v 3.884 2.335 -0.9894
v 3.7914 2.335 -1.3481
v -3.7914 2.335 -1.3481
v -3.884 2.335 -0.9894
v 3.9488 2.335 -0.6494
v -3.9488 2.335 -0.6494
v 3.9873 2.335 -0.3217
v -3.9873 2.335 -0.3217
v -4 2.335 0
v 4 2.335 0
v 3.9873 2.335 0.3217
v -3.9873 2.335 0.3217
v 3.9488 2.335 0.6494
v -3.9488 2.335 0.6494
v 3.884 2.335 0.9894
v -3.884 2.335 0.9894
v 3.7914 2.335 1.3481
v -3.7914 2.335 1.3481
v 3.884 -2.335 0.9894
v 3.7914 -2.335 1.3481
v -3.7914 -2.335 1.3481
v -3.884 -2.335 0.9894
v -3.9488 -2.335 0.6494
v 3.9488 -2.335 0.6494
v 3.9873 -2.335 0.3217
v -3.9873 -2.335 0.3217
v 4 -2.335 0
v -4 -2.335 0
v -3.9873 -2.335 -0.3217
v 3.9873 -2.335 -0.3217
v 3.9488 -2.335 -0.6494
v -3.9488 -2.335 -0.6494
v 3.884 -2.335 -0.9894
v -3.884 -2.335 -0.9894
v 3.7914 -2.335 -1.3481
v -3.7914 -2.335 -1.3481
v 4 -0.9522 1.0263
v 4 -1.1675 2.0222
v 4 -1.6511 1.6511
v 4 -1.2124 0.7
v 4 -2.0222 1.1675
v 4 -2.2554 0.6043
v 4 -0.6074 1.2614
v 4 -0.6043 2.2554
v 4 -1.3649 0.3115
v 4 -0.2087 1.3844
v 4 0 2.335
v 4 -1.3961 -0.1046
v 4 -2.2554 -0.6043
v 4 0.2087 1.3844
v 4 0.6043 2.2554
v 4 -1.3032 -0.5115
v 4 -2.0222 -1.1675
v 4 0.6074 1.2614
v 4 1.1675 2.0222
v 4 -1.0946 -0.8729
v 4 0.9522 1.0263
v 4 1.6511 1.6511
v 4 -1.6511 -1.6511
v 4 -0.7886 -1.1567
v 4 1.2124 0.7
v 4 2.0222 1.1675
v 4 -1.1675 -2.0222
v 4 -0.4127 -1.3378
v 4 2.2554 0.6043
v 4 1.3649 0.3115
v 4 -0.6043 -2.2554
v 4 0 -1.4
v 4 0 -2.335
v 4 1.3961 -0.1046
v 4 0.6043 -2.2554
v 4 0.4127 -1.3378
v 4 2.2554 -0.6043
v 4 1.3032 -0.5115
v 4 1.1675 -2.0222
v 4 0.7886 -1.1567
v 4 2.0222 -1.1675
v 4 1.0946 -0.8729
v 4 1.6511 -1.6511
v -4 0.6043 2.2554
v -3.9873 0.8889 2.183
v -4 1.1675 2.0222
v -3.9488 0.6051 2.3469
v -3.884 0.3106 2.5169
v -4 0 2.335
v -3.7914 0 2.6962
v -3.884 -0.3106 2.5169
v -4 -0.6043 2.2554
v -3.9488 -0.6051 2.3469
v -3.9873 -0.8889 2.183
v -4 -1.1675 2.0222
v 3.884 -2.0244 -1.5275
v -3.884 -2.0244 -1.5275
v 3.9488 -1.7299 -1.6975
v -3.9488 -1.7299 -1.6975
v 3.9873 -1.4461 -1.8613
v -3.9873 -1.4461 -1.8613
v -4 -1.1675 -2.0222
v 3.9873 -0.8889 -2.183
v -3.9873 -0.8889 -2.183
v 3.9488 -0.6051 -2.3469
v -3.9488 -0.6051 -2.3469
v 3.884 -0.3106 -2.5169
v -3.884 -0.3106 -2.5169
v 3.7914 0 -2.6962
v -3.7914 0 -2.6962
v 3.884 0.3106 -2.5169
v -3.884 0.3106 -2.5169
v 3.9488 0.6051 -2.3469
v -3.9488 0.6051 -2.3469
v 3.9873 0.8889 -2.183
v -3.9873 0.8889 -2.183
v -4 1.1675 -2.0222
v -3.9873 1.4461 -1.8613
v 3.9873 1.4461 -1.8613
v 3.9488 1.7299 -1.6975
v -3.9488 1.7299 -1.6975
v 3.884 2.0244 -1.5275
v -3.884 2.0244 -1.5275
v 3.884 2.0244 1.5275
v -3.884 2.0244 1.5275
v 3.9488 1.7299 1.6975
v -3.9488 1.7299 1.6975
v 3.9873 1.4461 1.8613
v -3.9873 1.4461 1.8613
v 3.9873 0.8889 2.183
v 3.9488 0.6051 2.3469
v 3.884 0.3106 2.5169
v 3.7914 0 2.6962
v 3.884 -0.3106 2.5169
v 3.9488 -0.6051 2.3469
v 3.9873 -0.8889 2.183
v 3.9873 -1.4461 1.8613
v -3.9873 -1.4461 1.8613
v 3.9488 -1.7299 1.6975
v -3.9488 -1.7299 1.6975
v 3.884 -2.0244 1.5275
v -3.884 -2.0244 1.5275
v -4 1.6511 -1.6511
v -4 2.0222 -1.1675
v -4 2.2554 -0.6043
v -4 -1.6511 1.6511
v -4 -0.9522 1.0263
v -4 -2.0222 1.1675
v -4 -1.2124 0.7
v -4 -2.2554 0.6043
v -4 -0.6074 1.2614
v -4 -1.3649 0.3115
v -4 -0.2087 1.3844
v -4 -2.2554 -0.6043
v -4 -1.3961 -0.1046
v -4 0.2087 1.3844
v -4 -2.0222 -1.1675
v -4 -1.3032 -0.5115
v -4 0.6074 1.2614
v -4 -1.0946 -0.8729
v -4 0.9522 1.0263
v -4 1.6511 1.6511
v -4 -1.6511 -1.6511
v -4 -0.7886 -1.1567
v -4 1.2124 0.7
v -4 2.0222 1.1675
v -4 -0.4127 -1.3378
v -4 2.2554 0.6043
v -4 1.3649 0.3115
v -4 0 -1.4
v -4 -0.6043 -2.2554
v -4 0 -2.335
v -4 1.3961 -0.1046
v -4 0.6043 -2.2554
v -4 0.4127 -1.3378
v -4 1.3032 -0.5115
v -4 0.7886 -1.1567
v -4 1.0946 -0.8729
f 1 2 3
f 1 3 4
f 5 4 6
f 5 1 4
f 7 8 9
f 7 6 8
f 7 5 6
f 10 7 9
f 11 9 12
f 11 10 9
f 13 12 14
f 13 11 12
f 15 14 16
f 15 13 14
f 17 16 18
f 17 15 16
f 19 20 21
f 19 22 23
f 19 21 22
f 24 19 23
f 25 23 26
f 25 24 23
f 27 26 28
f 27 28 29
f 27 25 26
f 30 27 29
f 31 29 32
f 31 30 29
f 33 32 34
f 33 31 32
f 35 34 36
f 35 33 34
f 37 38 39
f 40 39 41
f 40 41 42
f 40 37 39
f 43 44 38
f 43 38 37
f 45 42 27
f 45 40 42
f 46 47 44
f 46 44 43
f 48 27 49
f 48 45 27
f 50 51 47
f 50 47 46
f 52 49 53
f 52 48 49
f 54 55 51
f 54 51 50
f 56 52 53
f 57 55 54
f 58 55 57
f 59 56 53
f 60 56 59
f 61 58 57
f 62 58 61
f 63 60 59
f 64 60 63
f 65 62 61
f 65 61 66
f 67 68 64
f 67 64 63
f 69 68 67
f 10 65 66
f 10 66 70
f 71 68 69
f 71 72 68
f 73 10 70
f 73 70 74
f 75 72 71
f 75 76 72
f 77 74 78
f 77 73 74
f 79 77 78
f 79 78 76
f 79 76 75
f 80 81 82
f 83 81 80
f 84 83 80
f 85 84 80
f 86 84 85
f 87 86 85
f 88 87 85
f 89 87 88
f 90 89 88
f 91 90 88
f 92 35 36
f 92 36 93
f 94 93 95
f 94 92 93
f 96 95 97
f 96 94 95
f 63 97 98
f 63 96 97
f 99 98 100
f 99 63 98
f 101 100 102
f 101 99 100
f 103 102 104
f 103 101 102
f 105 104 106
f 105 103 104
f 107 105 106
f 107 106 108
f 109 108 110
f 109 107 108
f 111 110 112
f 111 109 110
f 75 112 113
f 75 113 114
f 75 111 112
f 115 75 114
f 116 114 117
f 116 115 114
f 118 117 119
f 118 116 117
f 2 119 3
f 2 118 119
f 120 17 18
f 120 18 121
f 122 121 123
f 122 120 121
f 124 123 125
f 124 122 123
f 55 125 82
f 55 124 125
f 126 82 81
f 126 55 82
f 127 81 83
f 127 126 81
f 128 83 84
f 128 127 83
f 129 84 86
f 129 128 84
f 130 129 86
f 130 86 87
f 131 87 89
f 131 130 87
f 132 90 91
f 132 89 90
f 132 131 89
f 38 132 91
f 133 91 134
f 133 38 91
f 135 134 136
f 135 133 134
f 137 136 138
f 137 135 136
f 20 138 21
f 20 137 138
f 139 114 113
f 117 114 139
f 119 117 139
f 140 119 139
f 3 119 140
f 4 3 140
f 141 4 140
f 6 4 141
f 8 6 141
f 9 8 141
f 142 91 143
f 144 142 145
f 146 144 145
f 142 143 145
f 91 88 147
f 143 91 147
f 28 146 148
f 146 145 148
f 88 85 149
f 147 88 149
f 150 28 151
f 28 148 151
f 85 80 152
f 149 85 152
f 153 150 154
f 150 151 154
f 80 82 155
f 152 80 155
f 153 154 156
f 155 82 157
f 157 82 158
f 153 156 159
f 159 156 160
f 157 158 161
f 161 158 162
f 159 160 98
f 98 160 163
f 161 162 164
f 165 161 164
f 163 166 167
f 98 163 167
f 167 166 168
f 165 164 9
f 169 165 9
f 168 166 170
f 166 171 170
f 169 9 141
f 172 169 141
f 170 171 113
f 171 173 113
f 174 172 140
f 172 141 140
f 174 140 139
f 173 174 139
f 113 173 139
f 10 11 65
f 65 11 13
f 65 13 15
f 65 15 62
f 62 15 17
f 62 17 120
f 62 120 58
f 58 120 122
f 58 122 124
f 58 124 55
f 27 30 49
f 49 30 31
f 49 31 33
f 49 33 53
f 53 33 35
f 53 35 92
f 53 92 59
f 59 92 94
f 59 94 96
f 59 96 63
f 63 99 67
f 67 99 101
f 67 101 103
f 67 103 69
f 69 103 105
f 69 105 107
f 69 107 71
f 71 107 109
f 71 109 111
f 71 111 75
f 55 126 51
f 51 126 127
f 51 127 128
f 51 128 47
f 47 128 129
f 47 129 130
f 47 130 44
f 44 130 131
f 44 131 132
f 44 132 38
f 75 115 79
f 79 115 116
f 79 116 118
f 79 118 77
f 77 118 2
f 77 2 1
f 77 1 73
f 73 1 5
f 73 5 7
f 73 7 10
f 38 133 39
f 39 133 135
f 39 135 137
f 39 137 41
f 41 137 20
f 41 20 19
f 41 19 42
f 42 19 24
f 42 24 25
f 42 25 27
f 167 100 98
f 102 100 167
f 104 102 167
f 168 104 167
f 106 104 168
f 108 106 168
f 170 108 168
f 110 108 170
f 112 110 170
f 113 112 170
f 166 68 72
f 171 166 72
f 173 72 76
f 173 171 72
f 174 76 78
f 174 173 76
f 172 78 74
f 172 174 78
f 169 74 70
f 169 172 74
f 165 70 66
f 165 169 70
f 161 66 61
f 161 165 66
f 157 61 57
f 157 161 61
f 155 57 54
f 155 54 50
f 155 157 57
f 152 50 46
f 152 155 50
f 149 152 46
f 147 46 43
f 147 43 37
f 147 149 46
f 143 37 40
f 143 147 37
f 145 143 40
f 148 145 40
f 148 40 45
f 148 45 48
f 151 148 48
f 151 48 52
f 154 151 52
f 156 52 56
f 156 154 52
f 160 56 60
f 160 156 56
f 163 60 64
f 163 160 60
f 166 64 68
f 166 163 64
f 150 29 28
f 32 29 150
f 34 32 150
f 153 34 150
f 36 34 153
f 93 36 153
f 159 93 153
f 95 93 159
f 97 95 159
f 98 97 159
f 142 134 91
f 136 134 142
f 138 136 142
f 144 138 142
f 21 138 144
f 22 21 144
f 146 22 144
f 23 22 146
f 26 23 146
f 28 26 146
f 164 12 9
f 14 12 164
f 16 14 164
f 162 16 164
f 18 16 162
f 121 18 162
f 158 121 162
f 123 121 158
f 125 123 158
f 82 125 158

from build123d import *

# Parameters (mm, degrees)
SKETCH1_R      = 1.4
EXTRUDE1_DEPTH = 4


# Read off the part's stored shape, not the designer's step: Cut-Extrude1
with BuildPart() as part:
    # Sketch1 → Extrude1 (new, symmetric)
    with BuildSketch(Plane(origin=(0, 0, 0), x_dir=(0, 0, -1), z_dir=(1, 0, 0))):
        Polygon((2.696225757, 0), (1.348112879, 2.335), (-1.348112879, 2.335), (-2.696225757, 0), (-1.348112879, -2.335), (1.348112879, -2.335), align=None)
        Circle(SKETCH1_R, mode=Mode.SUBTRACT)
    extrude(amount=EXTRUDE1_DEPTH, both=True)

    # Cut-Extrude1 outline → Cut-Extrude1 (revolve, cut)
    with BuildSketch(Plane.YX):
        Polygon((2.696225758, 4), (2.335, 4), (2.696225751, 3.791446215), align=None)
    cut_extrude1 = revolve(axis=Axis((0, 0, 0), (1, 0, 0)), mode=Mode.SUBTRACT)

    # Mirror1: Cut-Extrude1 across plane
    add(cut_extrude1.mirror(Plane(origin=(0, 0, 0), x_dir=(0, 0, 1), z_dir=(1, 0, 0))), mode=Mode.SUBTRACT)


solid = part.part
